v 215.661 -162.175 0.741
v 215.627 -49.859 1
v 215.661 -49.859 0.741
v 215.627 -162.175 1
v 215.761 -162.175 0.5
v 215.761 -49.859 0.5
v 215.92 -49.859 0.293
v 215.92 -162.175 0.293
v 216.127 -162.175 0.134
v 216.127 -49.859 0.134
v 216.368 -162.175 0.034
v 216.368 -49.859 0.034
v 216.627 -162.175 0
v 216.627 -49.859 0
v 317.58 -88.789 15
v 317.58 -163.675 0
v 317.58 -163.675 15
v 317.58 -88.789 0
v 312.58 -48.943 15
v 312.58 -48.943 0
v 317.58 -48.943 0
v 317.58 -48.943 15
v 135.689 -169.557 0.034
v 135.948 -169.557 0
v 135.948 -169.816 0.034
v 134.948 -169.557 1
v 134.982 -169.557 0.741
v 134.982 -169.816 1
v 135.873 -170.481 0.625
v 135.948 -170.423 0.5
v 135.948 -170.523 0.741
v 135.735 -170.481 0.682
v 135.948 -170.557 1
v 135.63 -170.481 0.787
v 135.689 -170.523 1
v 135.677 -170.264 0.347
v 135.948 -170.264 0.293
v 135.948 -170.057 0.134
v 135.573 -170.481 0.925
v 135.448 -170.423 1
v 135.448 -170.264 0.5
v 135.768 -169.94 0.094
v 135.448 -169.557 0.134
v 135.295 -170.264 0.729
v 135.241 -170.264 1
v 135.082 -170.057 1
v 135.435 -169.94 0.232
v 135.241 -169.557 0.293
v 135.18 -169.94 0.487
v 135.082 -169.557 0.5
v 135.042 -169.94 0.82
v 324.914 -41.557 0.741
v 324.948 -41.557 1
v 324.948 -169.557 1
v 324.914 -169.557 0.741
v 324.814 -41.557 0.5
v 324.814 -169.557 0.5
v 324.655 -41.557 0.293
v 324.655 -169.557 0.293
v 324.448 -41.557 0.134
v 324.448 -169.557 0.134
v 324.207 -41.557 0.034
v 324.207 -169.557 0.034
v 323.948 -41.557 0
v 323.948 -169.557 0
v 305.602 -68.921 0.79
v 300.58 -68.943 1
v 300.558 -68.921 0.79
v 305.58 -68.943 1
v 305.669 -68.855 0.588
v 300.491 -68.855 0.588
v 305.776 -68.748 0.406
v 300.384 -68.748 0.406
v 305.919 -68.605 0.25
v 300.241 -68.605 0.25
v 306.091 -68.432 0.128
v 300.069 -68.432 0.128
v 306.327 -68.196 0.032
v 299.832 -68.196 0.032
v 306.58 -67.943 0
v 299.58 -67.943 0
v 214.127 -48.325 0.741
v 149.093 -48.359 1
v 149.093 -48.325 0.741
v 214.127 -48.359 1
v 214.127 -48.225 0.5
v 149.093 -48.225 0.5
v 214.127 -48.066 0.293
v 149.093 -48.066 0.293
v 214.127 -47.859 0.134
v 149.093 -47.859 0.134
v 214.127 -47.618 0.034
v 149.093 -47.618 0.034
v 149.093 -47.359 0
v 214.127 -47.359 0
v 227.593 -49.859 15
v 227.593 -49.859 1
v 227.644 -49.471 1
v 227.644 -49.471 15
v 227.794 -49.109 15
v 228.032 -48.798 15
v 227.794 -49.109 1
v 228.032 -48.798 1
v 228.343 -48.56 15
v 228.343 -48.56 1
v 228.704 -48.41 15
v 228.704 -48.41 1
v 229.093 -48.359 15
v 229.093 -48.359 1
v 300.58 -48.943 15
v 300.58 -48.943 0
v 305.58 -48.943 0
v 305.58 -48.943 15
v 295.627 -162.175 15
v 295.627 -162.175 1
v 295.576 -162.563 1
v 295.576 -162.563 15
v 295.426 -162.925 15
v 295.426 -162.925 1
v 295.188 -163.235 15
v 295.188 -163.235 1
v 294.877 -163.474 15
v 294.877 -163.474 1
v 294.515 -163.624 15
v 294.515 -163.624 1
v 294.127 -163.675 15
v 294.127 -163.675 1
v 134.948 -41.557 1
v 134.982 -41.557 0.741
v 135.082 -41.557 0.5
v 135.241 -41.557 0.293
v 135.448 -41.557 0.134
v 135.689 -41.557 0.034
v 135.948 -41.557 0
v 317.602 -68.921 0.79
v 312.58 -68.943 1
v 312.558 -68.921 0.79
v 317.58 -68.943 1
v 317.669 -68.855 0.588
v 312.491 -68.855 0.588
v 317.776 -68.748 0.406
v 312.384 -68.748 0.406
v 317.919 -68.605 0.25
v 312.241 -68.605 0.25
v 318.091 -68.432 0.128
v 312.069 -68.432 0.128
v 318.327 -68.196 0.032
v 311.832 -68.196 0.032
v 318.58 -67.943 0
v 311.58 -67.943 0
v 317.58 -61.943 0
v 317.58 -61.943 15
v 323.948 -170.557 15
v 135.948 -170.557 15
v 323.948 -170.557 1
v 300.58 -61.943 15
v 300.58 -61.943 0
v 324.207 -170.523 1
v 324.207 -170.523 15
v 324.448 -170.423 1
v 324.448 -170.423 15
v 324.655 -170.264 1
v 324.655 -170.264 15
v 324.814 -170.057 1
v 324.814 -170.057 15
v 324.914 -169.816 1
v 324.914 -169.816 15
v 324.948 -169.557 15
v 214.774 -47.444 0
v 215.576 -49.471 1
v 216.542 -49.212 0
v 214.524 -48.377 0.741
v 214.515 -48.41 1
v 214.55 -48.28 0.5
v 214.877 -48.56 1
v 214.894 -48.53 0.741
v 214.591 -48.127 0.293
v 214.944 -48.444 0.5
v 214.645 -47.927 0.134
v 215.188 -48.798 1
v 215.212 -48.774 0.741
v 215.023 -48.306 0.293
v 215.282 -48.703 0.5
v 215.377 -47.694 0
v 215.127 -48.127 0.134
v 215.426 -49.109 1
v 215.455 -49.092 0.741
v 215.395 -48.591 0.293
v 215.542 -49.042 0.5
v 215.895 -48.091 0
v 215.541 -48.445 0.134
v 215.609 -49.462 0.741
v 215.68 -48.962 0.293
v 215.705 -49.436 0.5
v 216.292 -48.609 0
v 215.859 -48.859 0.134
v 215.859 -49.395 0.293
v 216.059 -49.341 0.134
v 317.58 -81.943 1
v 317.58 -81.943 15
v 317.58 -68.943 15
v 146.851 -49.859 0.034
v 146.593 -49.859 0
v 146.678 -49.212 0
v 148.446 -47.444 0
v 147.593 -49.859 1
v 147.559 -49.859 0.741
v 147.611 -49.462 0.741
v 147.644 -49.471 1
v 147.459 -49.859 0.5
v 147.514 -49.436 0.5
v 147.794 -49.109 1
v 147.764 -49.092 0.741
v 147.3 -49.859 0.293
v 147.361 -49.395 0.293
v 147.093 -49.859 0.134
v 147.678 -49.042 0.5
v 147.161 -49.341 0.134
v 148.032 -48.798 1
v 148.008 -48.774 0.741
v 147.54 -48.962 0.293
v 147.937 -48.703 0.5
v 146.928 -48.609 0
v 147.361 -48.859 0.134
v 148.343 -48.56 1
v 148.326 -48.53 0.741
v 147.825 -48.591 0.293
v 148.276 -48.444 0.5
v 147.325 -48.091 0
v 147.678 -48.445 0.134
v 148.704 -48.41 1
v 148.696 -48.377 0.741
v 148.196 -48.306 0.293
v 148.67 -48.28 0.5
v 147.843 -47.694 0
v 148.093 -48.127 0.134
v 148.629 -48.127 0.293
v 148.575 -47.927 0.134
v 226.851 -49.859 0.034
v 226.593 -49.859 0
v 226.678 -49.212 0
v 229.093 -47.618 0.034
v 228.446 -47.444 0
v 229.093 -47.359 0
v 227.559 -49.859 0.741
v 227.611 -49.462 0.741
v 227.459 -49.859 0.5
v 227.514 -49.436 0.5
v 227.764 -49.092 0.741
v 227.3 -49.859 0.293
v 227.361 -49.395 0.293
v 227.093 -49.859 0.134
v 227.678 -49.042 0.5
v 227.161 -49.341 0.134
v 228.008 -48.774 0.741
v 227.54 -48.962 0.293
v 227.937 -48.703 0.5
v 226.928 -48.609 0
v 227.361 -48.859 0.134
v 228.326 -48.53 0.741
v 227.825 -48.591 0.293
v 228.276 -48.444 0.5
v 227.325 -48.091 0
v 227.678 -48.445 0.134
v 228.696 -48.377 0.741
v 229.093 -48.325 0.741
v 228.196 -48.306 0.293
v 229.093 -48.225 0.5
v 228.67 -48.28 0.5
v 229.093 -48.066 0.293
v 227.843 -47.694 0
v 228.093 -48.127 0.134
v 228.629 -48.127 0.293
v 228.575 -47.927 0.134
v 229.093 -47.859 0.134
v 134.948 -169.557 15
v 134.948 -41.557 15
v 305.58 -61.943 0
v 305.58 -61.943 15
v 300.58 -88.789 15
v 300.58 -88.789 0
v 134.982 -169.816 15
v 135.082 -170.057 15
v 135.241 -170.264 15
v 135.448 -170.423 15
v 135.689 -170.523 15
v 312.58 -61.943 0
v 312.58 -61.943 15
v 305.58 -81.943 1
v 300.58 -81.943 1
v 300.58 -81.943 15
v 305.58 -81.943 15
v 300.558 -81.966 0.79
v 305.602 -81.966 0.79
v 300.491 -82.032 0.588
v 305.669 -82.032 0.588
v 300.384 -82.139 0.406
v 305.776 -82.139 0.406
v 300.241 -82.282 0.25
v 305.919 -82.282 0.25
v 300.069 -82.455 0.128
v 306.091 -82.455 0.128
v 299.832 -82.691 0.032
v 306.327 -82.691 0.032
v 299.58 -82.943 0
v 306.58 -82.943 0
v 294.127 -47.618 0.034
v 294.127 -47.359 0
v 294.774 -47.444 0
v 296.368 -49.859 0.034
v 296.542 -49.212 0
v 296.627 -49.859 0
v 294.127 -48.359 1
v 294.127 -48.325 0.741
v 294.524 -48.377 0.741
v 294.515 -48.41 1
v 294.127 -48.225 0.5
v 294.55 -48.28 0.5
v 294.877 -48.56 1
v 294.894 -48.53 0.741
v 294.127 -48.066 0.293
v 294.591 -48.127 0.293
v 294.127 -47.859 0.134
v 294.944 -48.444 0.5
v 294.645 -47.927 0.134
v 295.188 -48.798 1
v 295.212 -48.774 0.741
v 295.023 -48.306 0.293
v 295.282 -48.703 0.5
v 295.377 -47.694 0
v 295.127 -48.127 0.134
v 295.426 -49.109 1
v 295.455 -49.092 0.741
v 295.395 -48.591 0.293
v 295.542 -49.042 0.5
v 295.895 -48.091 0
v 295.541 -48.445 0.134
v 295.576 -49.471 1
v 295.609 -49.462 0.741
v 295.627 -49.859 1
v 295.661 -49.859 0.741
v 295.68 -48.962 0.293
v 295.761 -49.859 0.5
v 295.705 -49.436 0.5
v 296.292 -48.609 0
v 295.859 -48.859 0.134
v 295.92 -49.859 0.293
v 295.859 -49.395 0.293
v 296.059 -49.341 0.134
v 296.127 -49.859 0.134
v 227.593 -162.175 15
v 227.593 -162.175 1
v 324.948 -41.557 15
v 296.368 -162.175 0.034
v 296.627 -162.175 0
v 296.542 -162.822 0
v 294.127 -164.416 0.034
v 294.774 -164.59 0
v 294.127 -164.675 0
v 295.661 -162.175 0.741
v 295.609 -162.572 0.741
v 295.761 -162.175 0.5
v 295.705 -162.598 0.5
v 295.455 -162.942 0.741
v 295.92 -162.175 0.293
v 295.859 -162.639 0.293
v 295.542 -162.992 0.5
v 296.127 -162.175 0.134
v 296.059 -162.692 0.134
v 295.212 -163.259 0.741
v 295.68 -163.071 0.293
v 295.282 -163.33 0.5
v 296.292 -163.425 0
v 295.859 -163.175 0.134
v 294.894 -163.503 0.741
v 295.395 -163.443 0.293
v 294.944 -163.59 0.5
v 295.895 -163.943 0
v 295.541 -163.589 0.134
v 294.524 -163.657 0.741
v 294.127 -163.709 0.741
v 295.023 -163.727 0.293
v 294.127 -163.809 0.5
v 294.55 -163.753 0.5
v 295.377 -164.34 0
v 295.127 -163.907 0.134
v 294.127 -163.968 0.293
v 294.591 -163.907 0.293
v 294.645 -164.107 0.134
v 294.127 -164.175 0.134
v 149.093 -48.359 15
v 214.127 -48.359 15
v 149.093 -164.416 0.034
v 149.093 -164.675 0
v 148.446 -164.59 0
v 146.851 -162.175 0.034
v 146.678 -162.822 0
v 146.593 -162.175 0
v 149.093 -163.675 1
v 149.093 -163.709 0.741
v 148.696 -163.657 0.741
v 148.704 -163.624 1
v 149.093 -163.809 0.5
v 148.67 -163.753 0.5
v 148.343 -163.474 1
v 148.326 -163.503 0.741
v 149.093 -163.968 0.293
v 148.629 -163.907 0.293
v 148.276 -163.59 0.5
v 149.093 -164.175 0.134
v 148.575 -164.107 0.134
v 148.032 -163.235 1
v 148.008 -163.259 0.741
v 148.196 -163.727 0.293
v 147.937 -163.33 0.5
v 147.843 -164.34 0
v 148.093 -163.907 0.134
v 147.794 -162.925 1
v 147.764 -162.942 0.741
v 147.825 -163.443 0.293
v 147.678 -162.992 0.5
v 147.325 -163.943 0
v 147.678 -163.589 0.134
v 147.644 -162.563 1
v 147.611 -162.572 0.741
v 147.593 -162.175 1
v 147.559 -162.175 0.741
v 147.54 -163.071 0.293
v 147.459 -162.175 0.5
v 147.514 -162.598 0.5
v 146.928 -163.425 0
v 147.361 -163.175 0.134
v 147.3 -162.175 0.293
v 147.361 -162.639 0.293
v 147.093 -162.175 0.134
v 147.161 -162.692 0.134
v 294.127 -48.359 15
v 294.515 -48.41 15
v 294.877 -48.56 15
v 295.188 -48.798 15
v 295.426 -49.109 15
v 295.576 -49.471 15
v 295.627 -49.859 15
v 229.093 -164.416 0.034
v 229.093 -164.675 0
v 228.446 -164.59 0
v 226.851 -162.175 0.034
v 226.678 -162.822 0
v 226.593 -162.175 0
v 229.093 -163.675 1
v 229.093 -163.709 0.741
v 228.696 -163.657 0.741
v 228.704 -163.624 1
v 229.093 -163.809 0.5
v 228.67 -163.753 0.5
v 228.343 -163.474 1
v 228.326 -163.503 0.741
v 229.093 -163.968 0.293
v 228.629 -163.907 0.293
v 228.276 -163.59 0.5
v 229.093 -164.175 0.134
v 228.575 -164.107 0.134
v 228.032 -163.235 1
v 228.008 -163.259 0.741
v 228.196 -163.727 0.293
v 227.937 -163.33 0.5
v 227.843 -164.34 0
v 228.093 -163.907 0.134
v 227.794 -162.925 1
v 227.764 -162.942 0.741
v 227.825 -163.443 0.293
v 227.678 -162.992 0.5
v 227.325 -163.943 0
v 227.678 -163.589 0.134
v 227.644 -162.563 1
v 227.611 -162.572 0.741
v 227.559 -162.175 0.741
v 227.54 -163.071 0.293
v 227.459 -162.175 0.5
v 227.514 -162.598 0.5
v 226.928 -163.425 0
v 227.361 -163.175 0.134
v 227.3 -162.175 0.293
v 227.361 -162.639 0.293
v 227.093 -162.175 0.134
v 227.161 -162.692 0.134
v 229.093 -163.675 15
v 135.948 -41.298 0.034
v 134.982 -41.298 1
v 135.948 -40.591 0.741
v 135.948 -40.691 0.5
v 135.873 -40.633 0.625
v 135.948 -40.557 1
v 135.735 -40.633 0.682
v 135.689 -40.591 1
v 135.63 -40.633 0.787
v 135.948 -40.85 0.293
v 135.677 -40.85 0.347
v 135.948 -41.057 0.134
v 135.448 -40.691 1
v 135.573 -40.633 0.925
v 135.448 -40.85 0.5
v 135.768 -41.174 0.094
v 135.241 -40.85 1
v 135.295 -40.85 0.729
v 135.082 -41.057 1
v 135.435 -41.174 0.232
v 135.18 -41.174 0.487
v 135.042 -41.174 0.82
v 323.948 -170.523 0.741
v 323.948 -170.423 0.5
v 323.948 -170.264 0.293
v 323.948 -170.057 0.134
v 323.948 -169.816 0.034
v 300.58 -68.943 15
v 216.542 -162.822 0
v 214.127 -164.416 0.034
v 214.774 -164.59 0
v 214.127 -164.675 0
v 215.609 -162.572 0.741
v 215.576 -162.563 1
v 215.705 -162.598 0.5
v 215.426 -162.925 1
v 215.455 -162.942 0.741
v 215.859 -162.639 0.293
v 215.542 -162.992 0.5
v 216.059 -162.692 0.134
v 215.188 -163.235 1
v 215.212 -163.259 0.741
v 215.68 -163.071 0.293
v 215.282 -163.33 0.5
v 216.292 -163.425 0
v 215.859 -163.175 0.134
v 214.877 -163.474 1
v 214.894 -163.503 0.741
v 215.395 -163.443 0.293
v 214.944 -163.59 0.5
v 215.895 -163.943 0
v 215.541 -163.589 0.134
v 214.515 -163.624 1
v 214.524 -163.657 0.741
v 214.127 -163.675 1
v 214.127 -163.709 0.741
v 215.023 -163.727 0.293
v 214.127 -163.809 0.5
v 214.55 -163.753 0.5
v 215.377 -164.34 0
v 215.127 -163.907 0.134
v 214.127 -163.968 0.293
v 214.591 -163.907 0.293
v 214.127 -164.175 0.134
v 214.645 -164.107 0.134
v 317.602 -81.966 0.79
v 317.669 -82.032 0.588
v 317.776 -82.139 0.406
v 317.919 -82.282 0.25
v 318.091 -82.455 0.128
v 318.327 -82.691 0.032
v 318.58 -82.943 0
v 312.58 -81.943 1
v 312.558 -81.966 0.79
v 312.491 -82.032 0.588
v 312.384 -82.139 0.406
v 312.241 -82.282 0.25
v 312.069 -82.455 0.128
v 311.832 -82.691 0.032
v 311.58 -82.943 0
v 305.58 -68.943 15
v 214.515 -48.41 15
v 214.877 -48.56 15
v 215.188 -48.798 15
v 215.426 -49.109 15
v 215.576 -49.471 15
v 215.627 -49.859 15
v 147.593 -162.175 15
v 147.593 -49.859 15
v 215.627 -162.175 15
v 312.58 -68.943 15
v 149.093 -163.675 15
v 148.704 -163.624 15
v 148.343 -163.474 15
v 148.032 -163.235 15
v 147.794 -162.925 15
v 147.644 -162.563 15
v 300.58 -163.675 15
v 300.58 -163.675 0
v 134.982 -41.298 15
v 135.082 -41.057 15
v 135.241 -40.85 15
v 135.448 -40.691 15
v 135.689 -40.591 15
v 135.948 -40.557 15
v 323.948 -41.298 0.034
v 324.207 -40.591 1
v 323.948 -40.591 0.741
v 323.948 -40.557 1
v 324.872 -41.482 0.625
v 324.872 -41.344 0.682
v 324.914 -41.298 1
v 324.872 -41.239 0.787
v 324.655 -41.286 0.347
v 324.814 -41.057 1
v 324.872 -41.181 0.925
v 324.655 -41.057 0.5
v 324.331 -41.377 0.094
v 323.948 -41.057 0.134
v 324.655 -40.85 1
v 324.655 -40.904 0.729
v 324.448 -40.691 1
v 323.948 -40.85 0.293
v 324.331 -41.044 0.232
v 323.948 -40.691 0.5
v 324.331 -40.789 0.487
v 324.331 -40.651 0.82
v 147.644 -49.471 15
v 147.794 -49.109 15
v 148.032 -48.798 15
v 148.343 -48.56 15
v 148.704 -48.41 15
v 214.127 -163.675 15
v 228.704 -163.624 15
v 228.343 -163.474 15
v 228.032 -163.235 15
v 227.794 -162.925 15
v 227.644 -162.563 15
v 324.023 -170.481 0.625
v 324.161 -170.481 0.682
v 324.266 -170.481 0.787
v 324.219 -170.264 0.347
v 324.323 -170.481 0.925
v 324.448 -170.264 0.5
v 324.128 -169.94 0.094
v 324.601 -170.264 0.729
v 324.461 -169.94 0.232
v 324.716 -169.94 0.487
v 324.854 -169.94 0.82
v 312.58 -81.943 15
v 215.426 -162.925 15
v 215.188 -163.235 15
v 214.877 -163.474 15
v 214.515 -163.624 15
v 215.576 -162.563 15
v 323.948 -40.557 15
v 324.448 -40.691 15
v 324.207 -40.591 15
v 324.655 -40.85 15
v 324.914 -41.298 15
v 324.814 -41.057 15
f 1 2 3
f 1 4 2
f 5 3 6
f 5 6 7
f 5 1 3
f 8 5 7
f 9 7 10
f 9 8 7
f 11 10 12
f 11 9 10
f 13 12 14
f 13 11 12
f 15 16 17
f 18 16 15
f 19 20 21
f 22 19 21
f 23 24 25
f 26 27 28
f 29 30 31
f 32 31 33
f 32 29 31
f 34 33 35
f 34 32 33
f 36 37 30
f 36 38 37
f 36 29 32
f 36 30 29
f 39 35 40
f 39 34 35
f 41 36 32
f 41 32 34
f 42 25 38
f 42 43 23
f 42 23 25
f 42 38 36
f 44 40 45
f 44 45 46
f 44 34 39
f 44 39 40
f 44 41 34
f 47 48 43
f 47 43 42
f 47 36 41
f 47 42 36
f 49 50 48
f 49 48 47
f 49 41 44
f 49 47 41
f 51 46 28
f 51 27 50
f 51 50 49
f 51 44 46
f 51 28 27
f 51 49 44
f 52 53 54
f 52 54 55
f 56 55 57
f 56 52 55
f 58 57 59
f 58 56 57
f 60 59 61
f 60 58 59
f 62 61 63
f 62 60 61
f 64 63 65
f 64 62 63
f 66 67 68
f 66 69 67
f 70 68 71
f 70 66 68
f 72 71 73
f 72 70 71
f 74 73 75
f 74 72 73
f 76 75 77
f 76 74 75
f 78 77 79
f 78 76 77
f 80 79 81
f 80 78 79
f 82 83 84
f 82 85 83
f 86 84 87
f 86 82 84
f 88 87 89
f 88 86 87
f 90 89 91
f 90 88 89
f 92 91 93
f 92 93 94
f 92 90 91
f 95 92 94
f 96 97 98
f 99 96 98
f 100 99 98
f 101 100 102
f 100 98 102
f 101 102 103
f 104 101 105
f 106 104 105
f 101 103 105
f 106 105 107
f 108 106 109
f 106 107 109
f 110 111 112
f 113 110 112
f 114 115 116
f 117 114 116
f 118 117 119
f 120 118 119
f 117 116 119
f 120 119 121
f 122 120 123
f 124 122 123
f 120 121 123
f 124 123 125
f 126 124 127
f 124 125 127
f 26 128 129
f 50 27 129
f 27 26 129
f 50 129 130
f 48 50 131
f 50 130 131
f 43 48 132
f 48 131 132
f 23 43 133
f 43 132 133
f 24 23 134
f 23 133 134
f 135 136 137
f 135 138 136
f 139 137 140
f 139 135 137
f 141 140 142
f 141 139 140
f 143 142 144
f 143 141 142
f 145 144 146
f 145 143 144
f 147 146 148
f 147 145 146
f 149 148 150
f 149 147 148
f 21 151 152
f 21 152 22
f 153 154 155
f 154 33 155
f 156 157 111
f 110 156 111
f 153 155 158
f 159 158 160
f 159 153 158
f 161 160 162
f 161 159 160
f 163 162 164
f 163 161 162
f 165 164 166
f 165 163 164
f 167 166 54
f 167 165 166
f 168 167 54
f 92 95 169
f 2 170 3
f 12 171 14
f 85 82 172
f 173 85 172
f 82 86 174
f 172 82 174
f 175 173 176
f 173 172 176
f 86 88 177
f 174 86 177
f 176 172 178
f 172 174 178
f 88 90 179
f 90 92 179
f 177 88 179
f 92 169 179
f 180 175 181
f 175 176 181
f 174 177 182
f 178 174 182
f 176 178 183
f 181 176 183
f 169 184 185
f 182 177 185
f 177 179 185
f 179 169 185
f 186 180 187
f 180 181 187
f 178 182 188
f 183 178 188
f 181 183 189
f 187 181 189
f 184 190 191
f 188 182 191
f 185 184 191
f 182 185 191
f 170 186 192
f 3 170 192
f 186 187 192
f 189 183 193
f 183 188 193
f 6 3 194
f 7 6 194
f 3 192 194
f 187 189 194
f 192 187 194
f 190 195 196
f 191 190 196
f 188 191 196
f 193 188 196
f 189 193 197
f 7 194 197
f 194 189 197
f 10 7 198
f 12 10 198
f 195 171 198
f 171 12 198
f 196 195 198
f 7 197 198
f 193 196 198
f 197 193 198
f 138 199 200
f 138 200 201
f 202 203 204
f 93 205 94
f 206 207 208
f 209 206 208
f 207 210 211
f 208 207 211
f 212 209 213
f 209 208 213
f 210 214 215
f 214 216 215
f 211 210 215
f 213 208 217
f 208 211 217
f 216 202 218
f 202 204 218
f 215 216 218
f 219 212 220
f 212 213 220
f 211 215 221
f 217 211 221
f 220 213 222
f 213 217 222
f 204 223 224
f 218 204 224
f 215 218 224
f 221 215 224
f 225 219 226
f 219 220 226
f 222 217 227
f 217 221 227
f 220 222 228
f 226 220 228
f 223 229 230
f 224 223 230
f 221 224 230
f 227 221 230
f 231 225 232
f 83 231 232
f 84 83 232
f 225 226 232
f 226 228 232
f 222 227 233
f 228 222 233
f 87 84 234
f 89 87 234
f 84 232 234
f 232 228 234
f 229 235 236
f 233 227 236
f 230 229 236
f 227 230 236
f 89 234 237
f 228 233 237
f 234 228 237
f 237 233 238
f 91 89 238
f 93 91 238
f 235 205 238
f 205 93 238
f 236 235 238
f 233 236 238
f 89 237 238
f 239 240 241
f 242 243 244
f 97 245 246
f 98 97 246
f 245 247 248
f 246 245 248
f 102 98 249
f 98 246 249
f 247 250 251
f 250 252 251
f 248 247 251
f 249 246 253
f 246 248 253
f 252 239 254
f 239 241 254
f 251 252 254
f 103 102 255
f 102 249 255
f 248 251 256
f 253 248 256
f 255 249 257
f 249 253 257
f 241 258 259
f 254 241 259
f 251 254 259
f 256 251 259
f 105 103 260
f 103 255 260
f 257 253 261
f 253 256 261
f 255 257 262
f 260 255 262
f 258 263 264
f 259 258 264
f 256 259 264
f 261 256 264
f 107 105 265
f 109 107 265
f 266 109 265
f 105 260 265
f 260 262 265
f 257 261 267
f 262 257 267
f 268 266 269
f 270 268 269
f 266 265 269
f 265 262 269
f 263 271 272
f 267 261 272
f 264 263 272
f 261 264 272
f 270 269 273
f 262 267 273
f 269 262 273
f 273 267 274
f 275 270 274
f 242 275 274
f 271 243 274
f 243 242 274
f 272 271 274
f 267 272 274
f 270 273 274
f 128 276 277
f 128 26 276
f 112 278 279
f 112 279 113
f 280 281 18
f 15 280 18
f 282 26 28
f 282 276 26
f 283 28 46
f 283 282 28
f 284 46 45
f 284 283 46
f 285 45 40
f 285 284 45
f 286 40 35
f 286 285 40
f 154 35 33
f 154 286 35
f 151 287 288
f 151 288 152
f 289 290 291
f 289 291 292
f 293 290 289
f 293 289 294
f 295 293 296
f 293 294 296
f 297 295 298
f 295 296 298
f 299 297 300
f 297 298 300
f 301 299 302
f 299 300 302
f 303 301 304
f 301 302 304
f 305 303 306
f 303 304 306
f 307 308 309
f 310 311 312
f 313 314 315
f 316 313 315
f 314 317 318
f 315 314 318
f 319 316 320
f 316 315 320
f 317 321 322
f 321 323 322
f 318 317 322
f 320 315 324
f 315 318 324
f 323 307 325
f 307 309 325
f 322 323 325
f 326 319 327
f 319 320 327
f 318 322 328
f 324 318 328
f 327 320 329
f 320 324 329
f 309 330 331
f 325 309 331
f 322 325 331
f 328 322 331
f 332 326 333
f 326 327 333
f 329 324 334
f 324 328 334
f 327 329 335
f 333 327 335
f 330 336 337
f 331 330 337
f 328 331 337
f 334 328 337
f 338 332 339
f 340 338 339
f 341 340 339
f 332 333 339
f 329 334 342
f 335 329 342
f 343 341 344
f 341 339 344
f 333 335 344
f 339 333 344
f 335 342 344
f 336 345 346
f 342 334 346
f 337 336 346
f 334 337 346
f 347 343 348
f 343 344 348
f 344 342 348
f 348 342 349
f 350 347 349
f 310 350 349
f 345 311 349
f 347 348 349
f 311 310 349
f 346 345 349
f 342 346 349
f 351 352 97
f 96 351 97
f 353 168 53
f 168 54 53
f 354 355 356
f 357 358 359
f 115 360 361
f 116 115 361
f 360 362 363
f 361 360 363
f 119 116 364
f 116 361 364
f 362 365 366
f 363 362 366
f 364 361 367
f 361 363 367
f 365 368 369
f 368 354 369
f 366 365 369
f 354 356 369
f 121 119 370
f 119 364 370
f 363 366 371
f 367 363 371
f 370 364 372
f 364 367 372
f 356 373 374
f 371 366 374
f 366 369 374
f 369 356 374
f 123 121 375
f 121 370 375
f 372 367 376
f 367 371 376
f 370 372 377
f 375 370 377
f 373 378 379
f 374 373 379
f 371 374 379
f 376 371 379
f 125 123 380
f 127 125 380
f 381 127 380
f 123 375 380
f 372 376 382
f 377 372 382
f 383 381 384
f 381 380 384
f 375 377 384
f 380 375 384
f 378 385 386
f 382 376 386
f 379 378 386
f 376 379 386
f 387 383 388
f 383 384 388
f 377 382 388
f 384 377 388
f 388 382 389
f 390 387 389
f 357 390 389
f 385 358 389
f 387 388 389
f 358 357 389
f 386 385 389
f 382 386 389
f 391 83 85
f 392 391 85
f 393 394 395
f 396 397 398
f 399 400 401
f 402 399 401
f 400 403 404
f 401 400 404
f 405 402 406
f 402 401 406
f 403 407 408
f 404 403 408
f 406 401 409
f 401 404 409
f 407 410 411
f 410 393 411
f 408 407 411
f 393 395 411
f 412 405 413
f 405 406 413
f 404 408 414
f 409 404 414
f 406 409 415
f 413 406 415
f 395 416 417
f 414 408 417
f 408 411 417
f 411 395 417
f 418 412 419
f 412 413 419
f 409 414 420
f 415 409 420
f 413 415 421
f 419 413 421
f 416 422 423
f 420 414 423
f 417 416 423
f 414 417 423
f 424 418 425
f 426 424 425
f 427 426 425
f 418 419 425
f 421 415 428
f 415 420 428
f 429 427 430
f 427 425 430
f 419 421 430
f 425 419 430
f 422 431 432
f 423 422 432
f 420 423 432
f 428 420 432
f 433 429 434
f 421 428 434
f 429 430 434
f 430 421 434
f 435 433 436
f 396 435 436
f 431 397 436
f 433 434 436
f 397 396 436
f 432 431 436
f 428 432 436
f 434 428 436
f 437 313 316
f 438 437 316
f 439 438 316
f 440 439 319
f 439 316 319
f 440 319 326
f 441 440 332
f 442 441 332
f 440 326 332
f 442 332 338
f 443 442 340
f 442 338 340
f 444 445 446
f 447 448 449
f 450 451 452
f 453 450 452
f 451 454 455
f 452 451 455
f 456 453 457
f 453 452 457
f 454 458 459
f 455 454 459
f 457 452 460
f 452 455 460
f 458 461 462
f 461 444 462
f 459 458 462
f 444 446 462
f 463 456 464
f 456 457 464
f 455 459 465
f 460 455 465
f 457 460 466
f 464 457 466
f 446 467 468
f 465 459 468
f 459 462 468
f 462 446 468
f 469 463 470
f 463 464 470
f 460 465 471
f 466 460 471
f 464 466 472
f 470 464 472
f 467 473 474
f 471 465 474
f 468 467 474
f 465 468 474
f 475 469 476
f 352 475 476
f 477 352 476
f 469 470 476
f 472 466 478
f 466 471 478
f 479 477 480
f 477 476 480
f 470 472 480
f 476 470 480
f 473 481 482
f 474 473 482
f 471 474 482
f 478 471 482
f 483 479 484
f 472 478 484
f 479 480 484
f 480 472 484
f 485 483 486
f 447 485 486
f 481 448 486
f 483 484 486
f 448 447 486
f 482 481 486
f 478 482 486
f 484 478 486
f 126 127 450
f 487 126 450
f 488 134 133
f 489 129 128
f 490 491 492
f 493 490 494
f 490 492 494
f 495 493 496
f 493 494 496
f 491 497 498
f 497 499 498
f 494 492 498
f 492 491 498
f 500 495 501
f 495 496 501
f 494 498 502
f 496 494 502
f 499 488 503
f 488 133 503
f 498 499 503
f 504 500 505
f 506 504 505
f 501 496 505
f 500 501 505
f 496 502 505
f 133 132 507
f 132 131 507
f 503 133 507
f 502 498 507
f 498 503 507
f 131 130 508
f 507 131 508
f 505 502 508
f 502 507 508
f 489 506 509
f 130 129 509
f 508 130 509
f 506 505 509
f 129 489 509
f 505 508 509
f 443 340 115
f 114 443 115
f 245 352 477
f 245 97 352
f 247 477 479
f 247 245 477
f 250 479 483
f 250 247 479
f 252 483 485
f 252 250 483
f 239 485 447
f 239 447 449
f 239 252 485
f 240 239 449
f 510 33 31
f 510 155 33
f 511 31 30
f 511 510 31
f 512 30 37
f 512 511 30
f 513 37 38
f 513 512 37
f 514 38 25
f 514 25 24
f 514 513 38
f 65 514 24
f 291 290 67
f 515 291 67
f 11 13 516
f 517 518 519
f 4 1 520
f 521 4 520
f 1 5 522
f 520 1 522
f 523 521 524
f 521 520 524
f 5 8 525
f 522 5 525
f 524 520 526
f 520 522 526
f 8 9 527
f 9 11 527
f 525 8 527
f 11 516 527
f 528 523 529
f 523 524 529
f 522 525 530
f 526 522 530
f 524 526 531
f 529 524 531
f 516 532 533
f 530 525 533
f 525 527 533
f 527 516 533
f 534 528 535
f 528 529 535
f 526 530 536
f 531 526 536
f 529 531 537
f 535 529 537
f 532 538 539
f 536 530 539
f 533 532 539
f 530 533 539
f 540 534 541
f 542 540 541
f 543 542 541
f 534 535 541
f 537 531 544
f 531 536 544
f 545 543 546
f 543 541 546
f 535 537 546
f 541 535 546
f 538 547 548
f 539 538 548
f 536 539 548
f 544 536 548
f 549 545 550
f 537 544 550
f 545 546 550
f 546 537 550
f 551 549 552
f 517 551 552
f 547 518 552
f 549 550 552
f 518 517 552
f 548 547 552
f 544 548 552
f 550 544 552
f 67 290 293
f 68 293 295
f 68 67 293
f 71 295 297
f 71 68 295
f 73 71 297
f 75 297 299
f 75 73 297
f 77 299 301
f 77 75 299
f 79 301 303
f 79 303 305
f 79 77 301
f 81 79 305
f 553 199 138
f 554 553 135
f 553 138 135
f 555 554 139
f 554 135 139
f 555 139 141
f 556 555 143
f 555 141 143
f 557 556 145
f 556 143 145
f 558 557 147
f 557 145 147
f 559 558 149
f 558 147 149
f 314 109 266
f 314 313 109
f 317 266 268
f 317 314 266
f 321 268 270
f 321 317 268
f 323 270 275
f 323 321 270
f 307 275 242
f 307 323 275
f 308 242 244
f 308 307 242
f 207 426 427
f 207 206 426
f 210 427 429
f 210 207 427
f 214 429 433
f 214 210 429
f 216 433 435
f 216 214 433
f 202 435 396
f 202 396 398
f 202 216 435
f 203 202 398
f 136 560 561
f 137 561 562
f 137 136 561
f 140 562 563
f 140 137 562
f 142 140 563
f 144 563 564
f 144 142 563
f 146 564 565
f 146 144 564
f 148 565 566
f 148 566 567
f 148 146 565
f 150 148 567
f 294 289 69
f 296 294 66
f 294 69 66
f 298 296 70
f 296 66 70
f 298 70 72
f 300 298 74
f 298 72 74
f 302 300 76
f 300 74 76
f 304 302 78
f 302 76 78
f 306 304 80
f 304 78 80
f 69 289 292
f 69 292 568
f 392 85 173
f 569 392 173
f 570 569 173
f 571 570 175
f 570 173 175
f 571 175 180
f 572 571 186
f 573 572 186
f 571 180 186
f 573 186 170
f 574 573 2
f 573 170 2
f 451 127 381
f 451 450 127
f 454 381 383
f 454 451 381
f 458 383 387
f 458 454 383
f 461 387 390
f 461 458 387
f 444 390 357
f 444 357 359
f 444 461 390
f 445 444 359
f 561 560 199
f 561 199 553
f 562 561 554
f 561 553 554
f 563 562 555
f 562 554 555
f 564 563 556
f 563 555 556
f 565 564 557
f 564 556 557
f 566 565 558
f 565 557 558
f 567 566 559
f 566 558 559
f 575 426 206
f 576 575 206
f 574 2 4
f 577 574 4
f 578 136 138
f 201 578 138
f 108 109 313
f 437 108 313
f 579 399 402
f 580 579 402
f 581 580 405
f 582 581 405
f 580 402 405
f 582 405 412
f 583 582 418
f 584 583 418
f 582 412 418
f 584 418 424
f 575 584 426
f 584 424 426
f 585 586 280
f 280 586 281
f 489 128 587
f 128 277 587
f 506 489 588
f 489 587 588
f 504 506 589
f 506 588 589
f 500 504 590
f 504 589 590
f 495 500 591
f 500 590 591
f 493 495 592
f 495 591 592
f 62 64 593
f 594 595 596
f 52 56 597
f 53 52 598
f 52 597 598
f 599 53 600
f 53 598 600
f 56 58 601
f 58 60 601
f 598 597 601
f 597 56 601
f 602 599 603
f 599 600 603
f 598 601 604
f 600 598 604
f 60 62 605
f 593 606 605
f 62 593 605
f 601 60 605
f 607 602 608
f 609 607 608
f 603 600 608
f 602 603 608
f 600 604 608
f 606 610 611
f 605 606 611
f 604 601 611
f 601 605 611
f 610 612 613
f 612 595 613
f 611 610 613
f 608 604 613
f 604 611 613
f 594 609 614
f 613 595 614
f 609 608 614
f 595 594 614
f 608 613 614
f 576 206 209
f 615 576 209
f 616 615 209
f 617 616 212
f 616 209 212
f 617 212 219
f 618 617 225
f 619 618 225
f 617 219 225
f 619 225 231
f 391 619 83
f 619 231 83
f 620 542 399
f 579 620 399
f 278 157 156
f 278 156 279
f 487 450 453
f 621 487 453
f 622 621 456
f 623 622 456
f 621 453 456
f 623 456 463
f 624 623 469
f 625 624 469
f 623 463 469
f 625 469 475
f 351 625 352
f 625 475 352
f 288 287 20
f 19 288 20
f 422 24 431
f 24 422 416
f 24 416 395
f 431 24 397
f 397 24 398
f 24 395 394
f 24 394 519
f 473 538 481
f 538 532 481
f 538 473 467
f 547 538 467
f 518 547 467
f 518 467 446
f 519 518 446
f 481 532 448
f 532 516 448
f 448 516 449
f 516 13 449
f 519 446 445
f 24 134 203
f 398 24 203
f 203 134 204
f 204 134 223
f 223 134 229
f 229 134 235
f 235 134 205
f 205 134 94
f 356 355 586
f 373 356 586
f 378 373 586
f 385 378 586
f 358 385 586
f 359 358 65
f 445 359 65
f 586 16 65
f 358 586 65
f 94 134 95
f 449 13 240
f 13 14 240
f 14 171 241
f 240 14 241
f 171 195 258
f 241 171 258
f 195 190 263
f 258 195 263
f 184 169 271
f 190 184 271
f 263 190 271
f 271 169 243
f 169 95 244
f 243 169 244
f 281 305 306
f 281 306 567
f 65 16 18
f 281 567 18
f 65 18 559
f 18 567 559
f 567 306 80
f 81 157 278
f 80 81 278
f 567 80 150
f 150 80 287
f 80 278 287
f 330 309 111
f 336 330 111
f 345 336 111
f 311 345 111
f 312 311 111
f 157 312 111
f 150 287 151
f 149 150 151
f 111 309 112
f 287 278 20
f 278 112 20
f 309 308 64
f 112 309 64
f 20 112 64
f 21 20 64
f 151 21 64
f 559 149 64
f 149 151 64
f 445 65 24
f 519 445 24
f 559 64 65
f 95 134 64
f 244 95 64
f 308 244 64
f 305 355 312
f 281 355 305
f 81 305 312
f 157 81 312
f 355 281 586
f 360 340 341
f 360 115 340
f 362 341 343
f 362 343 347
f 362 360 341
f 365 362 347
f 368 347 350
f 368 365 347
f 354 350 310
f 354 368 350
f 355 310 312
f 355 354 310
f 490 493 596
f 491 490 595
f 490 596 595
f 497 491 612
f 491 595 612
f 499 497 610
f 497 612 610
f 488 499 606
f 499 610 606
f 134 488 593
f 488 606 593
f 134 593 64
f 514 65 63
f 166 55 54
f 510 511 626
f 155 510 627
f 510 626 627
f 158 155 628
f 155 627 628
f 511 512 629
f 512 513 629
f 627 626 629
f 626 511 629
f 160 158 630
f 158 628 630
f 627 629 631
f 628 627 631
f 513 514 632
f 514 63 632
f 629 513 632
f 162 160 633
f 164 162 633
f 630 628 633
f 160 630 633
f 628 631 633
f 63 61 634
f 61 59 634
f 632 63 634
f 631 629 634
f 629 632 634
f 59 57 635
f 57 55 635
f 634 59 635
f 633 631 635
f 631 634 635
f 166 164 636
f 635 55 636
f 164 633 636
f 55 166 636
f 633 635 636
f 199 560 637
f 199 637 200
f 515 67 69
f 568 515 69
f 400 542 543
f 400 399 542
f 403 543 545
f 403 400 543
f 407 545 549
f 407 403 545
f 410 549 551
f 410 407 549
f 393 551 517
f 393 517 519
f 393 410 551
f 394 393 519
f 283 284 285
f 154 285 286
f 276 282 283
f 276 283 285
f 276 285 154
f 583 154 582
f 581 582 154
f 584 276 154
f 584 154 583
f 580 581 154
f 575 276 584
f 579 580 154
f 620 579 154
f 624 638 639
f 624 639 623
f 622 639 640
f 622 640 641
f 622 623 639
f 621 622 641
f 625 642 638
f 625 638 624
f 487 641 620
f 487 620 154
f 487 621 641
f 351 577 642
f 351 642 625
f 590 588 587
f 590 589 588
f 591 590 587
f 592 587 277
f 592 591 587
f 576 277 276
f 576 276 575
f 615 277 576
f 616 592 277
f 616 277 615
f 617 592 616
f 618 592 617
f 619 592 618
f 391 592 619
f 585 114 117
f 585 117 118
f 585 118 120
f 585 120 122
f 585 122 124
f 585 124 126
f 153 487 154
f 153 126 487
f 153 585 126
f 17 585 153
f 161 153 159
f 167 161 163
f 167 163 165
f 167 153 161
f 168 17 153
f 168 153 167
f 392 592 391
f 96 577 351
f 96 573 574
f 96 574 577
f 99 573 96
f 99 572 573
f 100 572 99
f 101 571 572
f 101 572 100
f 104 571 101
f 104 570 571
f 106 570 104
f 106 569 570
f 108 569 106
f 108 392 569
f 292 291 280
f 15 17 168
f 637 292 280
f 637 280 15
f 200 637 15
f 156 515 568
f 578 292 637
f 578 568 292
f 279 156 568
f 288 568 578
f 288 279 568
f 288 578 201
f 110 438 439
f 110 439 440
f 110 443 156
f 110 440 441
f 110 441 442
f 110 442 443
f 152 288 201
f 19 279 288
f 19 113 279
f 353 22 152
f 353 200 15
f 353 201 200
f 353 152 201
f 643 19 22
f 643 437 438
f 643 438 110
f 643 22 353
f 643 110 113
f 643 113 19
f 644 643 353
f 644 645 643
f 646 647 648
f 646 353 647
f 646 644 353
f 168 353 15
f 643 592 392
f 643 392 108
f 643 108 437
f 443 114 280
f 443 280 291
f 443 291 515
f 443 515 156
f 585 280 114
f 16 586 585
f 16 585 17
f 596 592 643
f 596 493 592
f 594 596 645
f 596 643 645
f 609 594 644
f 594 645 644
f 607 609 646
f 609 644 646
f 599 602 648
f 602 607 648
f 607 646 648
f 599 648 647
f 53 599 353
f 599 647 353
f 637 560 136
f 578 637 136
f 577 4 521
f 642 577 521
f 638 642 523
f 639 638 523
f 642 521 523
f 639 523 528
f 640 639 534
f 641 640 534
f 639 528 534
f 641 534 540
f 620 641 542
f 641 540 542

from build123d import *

# Parameters (mm, degrees)
ESQUISSE2_W        = 190
ESQUISSE2_H        = 130
ESQUISSE2_W_2      = 5
ESQUISSE2_H_2      = 13
ESQUISSE2_W_3      = 17
ESQUISSE2_H_3      = 74.885911828
BOSS_EXTRU_1_DEPTH = 15
CONG_1_R           = 1


with BuildPart() as part:
    # Esquisse2 → Boss.-Extru.1 (new body)
    with BuildSketch(Plane.XY):
        with Locations((229.947995903, -105.556817115)):
            Rectangle(ESQUISSE2_W, ESQUISSE2_H)
        with BuildLine():
            Line((294.126931092, -163.674733602), (229.09264334, -163.674733602))
            ThreePointArc((229.09264334, -163.674733602), (228.031983168, -163.235393774), (227.59264334, -162.174733602))
            Line((227.59264334, -162.174733602), (227.59264334, -49.858733602))
            ThreePointArc((227.59264334, -49.858733602), (228.031983168, -48.79807343), (229.09264334, -48.358733602))
            Line((229.09264334, -48.358733602), (294.126931092, -48.358733602))
            ThreePointArc((294.126931092, -48.358733602), (295.187591264, -48.79807343), (295.626931092, -49.858733602))
            Line((295.626931092, -49.858733602), (295.626931092, -162.174733602))
            ThreePointArc((295.626931092, -162.174733602), (295.187591264, -163.235393774), (294.126931092, -163.674733602))
        make_face(mode=Mode.SUBTRACT)
        with BuildLine():
            Line((214.126931092, -163.674733602), (149.09264334, -163.674733602))
            ThreePointArc((149.09264334, -163.674733602), (148.031983168, -163.235393774), (147.59264334, -162.174733602))
            Line((147.59264334, -162.174733602), (147.59264334, -49.858733602))
            ThreePointArc((147.59264334, -49.858733602), (148.031983168, -48.79807343), (149.09264334, -48.358733602))
            Line((149.09264334, -48.358733602), (214.126931092, -48.358733602))
            ThreePointArc((214.126931092, -48.358733602), (215.187591264, -48.79807343), (215.626931092, -49.858733602))
            Line((215.626931092, -49.858733602), (215.626931092, -162.174733602))
            ThreePointArc((215.626931092, -162.174733602), (215.187591264, -163.235393774), (214.126931092, -163.674733602))
        make_face(mode=Mode.SUBTRACT)
        with Locations((315.079916598, -55.443215784)):
            Rectangle(ESQUISSE2_W_2, ESQUISSE2_H_2, mode=Mode.SUBTRACT)
        with Locations((303.079916598, -55.443215784)):
            Rectangle(ESQUISSE2_W_2, ESQUISSE2_H_2, mode=Mode.SUBTRACT)
        with Locations((315.079916598, -75.443215784)):
            Rectangle(ESQUISSE2_W_2, ESQUISSE2_H_2, mode=Mode.SUBTRACT)
        with Locations((303.079916598, -75.443215784)):
            Rectangle(ESQUISSE2_W_2, ESQUISSE2_H_2, mode=Mode.SUBTRACT)
        with Locations((309.079916598, -126.231777688)):
            Rectangle(ESQUISSE2_W_3, ESQUISSE2_H_3, mode=Mode.SUBTRACT)
    extrude(amount=BOSS_EXTRU_1_DEPTH)

    # Congé1
    cong_1_edges = [part.edges().sort_by_distance(p)[0] for p in [
        (295.187591264, -163.235393774, 0),
        (295.626931092, -106.016733602, 0),
        (295.187591264, -48.79807343, 0),
        (261.609787216, -48.358733602, 0),
        (228.031983168, -48.79807343, 0),
        (227.59264334, -106.016733602, 0),
        (228.031983168, -163.235393774, 0),
        (261.609787216, -163.674733602, 0),
        (305.579916598, -75.443215784, 0),
        (303.079916598, -68.943215784, 0),
        (300.579916598, -75.443215784, 0),
        (303.079916598, -81.943215784, 0),
        (317.579916598, -75.443215784, 0),
        (315.079916598, -68.943215784, 0),
        (312.579916598, -75.443215784, 0),
        (315.079916598, -81.943215784, 0),
        (134.947995903, -105.556817115, 0),
        (229.947995903, -40.556817115, 0),
        (324.947995903, -105.556817115, 0),
        (229.947995903, -170.556817115, 0),
        (215.187591264, -163.235393774, 0),
        (215.626931092, -106.016733602, 0),
        (215.187591264, -48.79807343, 0),
        (181.609787216, -48.358733602, 0),
        (148.031983168, -48.79807343, 0),
        (147.59264334, -106.016733602, 0),
        (148.031983168, -163.235393774, 0),
        (181.609787216, -163.674733602, 0),
        (134.947995903, -170.556817115, 7.5),
        (134.947995903, -40.556817115, 7.5),
        (324.947995903, -40.556817115, 7.5),
        (324.947995903, -170.556817115, 7.5),
    ]]
    fillet(cong_1_edges, radius=CONG_1_R)


solid = part.part
